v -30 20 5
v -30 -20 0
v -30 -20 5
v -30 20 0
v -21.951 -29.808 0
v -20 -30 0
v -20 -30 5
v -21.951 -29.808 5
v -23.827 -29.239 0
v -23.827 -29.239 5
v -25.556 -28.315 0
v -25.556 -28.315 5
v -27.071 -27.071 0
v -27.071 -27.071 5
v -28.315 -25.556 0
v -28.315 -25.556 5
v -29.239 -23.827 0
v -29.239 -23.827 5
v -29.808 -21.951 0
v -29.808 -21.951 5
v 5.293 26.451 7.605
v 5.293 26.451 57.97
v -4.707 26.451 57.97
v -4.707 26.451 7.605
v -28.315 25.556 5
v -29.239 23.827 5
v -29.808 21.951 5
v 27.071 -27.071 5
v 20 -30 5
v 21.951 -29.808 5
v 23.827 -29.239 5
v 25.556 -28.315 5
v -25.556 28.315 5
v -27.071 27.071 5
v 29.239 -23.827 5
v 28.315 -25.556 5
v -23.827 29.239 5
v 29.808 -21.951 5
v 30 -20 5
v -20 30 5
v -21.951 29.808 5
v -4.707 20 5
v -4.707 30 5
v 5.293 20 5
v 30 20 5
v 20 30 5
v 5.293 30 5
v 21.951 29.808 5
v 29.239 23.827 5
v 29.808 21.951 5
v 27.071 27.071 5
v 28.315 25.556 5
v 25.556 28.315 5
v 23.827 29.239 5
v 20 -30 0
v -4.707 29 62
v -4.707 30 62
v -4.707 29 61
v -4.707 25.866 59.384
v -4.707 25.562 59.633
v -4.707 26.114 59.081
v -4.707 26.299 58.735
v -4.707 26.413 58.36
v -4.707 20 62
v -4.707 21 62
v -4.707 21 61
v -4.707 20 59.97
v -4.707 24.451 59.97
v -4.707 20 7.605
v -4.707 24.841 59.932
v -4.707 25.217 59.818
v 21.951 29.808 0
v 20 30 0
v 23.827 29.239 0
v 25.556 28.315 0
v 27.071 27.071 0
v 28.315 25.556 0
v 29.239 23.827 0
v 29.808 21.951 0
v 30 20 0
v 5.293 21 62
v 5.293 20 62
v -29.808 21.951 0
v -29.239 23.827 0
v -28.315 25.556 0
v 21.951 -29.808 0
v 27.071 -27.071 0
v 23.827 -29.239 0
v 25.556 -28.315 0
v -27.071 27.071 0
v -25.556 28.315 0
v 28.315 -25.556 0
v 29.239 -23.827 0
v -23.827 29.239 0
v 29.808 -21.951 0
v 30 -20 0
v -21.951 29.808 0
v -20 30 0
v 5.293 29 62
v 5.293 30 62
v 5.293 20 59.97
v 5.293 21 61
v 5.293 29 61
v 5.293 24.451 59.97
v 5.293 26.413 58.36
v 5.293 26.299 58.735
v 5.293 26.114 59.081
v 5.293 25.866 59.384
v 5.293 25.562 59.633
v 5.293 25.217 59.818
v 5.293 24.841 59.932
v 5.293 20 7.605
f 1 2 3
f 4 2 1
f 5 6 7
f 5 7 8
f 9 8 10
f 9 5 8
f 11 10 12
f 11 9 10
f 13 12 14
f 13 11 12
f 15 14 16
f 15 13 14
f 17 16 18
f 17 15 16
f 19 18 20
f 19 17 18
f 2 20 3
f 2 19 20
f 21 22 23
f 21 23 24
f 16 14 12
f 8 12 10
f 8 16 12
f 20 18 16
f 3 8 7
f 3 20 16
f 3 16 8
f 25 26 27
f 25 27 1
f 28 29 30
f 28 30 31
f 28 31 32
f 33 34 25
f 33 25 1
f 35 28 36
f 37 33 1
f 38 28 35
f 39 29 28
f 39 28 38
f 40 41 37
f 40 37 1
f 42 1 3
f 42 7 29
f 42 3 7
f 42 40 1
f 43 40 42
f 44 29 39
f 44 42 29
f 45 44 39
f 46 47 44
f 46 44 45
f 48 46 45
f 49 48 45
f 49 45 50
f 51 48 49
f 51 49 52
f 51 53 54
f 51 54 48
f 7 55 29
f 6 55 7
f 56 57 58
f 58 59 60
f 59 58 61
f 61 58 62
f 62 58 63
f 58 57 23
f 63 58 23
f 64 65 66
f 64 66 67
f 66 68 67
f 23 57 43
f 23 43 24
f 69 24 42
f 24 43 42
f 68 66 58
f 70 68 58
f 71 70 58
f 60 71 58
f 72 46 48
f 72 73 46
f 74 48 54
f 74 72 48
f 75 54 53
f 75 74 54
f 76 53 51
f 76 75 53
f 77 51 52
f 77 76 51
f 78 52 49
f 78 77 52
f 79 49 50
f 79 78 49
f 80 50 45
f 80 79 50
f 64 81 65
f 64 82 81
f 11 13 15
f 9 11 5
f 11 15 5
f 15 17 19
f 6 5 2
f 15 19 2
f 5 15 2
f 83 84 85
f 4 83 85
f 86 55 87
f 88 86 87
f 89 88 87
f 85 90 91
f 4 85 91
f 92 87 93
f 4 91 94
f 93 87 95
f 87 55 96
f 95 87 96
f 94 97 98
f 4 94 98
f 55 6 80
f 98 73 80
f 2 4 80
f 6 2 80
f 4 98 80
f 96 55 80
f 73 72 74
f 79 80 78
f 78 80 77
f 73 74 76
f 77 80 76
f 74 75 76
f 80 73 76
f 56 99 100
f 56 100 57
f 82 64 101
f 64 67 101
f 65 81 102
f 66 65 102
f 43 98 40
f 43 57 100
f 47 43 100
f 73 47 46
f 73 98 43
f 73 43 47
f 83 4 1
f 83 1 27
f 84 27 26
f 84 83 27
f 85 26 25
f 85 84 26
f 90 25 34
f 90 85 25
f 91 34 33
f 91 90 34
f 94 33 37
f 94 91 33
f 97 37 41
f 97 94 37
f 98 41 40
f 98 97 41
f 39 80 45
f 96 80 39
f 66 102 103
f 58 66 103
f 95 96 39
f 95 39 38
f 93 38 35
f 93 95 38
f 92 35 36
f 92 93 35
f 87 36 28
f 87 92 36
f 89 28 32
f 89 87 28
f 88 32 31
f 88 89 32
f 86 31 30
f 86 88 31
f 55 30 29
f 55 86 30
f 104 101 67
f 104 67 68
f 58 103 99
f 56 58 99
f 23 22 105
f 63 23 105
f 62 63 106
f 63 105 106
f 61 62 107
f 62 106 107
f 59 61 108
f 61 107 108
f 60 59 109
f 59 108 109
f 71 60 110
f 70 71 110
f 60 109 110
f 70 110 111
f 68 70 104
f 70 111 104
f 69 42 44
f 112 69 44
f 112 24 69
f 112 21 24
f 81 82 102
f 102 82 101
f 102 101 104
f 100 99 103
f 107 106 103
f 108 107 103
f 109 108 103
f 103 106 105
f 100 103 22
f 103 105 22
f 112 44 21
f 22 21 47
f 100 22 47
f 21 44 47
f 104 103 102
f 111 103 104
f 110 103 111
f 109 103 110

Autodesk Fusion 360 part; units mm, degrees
sketch "base" plane through (0, 0, 0) normal (0, 0, 1) x (1, 0, 0)
  line L0 (-20, 30) -> (20, 30)
  line L1 (30, 20) -> (30, -20)
  line L2 (20, -30) -> (-20, -30)
  line L3 (-30, -20) -> (-30, 20)
  line L4 (-30, 30) -> (30, -30) construction
  line L5 (30, 30) -> (-30, -30) construction
  arc A0 (-20, 30) -> (-30, 20) centre (-20, 20) ccw
  arc A1 (30, 20) -> (20, 30) centre (20, 20) ccw
  arc A2 (20, -30) -> (30, -20) centre (20, -20) ccw
  arc A3 (-30, -20) -> (-20, -30) centre (-20, -20) ccw
  dimension "d1" = 10
  dimension "d2" = 40
  dimension "d3" = 40
extrude "Extrude1" add sketch "base" along normal blind 5
sketch "post anchor" plane through (0, 0, 5) normal (0, 0, 1) x (-1, 0, 0)
  arc A0 (20, -30) -> (30, -20) centre (20, -20) ccw
  line L0 (30, -20) -> (30, 20)
  arc A1 (30, 20) -> (20, 30) centre (20, 20) ccw
  line L1 (20, 30) -> (-20, 30)
  arc A2 (-20, 30) -> (-30, 20) centre (-20, 20) ccw
  line L2 (-30, 20) -> (-30, -20)
  arc A3 (-30, -20) -> (-20, -30) centre (-20, -20) ccw
  line L3 (-20, -30) -> (20, -30)
  line L4 (4.7066, -30) -> (-5.2934, -30)
  line L5 (4.7066, -30) -> (4.7066, -20)
  line L6 (4.7066, -20) -> (-5.2934, -20)
  line L7 (-5.2934, -20) -> (-5.2934, -30)
  point P0 (0, -30)
  dimension "d6" = 10
  dimension "d7" = 10
extrude "Extrude2" add sketch "post anchor" along normal blind 57 contours L3 L4 L5 L6 L7
sketch "stand profile" plane through (5.2934, 0, 0) normal (1, 0, 0) x (0, 1, 0)
  line L0 (20, 5) -> (30, 5)
  line L1 (30, 5) -> (30, 62)
  line L2 (30, 62) -> (20, 62)
  line L3 (20, 62) -> (20, 5)
  line L4 (20, 5) -> (30, 5)
  line L5 (30, 62) -> (20, 62)
  line L6 (20, 59.97) -> (24.4513, 59.97)
  line L7 (26.4513, 57.97) -> (26.4513, 7.6053)
  line L8 (26.4513, 7.6053) -> (20, 7.6053)
  line L9 (20, 5) -> (20, 7.6053)
  line L10 (20, 62) -> (20, 59.97)
  arc A0 (26.4513, 57.97) -> (24.4513, 59.97) centre (24.4513, 57.97) ccw
  dimension "d10" = 3.5487
  dimension "d11" = 2.6053
  dimension "d12" = 2.03
  dimension "d13" = 2
extrude "Extrude3" cut sketch "stand profile" against normal blind 10 contours L3 L6 L7 L8 A0
sketch "headphone rest" plane through (5.2934, 0, 0) normal (1, 0, 0) x (0, 1, 0)
  line L0 (26.4513, 7.6053) -> (20, 7.6053)
  line L1 (20, 7.6053) -> (20, 5)
  line L2 (20, 5) -> (30, 5)
  line L3 (30, 5) -> (30, 62)
  line L4 (30, 62) -> (20, 62)
  line L5 (20, 62) -> (20, 59.97)
  line L6 (20, 59.97) -> (24.4513, 59.97)
  arc A0 (26.4513, 57.97) -> (24.4513, 59.97) centre (24.4513, 57.97) ccw
  line L7 (26.4513, 57.97) -> (26.4513, 7.6053)
  line L8 (21, 62) -> (21, 61)
  line L9 (21, 61) -> (29, 61)
  line L10 (29, 61) -> (29, 62)
  line L11 (30, 62) -> (30, 60.477)
  line L12 (20, 60.477) -> (20, 62)
  line L13 (21, 62) -> (20, 62)
  line L14 (20, 60.477) -> (30, 60.477)
  dimension "d16" = 1
  dimension "d17" = 1
  dimension "d18" = 0.523
  dimension "d19" = 1
extrude "Extrude4" cut sketch "headphone rest" against normal blind 10 contours L4 L8 L9 L10
